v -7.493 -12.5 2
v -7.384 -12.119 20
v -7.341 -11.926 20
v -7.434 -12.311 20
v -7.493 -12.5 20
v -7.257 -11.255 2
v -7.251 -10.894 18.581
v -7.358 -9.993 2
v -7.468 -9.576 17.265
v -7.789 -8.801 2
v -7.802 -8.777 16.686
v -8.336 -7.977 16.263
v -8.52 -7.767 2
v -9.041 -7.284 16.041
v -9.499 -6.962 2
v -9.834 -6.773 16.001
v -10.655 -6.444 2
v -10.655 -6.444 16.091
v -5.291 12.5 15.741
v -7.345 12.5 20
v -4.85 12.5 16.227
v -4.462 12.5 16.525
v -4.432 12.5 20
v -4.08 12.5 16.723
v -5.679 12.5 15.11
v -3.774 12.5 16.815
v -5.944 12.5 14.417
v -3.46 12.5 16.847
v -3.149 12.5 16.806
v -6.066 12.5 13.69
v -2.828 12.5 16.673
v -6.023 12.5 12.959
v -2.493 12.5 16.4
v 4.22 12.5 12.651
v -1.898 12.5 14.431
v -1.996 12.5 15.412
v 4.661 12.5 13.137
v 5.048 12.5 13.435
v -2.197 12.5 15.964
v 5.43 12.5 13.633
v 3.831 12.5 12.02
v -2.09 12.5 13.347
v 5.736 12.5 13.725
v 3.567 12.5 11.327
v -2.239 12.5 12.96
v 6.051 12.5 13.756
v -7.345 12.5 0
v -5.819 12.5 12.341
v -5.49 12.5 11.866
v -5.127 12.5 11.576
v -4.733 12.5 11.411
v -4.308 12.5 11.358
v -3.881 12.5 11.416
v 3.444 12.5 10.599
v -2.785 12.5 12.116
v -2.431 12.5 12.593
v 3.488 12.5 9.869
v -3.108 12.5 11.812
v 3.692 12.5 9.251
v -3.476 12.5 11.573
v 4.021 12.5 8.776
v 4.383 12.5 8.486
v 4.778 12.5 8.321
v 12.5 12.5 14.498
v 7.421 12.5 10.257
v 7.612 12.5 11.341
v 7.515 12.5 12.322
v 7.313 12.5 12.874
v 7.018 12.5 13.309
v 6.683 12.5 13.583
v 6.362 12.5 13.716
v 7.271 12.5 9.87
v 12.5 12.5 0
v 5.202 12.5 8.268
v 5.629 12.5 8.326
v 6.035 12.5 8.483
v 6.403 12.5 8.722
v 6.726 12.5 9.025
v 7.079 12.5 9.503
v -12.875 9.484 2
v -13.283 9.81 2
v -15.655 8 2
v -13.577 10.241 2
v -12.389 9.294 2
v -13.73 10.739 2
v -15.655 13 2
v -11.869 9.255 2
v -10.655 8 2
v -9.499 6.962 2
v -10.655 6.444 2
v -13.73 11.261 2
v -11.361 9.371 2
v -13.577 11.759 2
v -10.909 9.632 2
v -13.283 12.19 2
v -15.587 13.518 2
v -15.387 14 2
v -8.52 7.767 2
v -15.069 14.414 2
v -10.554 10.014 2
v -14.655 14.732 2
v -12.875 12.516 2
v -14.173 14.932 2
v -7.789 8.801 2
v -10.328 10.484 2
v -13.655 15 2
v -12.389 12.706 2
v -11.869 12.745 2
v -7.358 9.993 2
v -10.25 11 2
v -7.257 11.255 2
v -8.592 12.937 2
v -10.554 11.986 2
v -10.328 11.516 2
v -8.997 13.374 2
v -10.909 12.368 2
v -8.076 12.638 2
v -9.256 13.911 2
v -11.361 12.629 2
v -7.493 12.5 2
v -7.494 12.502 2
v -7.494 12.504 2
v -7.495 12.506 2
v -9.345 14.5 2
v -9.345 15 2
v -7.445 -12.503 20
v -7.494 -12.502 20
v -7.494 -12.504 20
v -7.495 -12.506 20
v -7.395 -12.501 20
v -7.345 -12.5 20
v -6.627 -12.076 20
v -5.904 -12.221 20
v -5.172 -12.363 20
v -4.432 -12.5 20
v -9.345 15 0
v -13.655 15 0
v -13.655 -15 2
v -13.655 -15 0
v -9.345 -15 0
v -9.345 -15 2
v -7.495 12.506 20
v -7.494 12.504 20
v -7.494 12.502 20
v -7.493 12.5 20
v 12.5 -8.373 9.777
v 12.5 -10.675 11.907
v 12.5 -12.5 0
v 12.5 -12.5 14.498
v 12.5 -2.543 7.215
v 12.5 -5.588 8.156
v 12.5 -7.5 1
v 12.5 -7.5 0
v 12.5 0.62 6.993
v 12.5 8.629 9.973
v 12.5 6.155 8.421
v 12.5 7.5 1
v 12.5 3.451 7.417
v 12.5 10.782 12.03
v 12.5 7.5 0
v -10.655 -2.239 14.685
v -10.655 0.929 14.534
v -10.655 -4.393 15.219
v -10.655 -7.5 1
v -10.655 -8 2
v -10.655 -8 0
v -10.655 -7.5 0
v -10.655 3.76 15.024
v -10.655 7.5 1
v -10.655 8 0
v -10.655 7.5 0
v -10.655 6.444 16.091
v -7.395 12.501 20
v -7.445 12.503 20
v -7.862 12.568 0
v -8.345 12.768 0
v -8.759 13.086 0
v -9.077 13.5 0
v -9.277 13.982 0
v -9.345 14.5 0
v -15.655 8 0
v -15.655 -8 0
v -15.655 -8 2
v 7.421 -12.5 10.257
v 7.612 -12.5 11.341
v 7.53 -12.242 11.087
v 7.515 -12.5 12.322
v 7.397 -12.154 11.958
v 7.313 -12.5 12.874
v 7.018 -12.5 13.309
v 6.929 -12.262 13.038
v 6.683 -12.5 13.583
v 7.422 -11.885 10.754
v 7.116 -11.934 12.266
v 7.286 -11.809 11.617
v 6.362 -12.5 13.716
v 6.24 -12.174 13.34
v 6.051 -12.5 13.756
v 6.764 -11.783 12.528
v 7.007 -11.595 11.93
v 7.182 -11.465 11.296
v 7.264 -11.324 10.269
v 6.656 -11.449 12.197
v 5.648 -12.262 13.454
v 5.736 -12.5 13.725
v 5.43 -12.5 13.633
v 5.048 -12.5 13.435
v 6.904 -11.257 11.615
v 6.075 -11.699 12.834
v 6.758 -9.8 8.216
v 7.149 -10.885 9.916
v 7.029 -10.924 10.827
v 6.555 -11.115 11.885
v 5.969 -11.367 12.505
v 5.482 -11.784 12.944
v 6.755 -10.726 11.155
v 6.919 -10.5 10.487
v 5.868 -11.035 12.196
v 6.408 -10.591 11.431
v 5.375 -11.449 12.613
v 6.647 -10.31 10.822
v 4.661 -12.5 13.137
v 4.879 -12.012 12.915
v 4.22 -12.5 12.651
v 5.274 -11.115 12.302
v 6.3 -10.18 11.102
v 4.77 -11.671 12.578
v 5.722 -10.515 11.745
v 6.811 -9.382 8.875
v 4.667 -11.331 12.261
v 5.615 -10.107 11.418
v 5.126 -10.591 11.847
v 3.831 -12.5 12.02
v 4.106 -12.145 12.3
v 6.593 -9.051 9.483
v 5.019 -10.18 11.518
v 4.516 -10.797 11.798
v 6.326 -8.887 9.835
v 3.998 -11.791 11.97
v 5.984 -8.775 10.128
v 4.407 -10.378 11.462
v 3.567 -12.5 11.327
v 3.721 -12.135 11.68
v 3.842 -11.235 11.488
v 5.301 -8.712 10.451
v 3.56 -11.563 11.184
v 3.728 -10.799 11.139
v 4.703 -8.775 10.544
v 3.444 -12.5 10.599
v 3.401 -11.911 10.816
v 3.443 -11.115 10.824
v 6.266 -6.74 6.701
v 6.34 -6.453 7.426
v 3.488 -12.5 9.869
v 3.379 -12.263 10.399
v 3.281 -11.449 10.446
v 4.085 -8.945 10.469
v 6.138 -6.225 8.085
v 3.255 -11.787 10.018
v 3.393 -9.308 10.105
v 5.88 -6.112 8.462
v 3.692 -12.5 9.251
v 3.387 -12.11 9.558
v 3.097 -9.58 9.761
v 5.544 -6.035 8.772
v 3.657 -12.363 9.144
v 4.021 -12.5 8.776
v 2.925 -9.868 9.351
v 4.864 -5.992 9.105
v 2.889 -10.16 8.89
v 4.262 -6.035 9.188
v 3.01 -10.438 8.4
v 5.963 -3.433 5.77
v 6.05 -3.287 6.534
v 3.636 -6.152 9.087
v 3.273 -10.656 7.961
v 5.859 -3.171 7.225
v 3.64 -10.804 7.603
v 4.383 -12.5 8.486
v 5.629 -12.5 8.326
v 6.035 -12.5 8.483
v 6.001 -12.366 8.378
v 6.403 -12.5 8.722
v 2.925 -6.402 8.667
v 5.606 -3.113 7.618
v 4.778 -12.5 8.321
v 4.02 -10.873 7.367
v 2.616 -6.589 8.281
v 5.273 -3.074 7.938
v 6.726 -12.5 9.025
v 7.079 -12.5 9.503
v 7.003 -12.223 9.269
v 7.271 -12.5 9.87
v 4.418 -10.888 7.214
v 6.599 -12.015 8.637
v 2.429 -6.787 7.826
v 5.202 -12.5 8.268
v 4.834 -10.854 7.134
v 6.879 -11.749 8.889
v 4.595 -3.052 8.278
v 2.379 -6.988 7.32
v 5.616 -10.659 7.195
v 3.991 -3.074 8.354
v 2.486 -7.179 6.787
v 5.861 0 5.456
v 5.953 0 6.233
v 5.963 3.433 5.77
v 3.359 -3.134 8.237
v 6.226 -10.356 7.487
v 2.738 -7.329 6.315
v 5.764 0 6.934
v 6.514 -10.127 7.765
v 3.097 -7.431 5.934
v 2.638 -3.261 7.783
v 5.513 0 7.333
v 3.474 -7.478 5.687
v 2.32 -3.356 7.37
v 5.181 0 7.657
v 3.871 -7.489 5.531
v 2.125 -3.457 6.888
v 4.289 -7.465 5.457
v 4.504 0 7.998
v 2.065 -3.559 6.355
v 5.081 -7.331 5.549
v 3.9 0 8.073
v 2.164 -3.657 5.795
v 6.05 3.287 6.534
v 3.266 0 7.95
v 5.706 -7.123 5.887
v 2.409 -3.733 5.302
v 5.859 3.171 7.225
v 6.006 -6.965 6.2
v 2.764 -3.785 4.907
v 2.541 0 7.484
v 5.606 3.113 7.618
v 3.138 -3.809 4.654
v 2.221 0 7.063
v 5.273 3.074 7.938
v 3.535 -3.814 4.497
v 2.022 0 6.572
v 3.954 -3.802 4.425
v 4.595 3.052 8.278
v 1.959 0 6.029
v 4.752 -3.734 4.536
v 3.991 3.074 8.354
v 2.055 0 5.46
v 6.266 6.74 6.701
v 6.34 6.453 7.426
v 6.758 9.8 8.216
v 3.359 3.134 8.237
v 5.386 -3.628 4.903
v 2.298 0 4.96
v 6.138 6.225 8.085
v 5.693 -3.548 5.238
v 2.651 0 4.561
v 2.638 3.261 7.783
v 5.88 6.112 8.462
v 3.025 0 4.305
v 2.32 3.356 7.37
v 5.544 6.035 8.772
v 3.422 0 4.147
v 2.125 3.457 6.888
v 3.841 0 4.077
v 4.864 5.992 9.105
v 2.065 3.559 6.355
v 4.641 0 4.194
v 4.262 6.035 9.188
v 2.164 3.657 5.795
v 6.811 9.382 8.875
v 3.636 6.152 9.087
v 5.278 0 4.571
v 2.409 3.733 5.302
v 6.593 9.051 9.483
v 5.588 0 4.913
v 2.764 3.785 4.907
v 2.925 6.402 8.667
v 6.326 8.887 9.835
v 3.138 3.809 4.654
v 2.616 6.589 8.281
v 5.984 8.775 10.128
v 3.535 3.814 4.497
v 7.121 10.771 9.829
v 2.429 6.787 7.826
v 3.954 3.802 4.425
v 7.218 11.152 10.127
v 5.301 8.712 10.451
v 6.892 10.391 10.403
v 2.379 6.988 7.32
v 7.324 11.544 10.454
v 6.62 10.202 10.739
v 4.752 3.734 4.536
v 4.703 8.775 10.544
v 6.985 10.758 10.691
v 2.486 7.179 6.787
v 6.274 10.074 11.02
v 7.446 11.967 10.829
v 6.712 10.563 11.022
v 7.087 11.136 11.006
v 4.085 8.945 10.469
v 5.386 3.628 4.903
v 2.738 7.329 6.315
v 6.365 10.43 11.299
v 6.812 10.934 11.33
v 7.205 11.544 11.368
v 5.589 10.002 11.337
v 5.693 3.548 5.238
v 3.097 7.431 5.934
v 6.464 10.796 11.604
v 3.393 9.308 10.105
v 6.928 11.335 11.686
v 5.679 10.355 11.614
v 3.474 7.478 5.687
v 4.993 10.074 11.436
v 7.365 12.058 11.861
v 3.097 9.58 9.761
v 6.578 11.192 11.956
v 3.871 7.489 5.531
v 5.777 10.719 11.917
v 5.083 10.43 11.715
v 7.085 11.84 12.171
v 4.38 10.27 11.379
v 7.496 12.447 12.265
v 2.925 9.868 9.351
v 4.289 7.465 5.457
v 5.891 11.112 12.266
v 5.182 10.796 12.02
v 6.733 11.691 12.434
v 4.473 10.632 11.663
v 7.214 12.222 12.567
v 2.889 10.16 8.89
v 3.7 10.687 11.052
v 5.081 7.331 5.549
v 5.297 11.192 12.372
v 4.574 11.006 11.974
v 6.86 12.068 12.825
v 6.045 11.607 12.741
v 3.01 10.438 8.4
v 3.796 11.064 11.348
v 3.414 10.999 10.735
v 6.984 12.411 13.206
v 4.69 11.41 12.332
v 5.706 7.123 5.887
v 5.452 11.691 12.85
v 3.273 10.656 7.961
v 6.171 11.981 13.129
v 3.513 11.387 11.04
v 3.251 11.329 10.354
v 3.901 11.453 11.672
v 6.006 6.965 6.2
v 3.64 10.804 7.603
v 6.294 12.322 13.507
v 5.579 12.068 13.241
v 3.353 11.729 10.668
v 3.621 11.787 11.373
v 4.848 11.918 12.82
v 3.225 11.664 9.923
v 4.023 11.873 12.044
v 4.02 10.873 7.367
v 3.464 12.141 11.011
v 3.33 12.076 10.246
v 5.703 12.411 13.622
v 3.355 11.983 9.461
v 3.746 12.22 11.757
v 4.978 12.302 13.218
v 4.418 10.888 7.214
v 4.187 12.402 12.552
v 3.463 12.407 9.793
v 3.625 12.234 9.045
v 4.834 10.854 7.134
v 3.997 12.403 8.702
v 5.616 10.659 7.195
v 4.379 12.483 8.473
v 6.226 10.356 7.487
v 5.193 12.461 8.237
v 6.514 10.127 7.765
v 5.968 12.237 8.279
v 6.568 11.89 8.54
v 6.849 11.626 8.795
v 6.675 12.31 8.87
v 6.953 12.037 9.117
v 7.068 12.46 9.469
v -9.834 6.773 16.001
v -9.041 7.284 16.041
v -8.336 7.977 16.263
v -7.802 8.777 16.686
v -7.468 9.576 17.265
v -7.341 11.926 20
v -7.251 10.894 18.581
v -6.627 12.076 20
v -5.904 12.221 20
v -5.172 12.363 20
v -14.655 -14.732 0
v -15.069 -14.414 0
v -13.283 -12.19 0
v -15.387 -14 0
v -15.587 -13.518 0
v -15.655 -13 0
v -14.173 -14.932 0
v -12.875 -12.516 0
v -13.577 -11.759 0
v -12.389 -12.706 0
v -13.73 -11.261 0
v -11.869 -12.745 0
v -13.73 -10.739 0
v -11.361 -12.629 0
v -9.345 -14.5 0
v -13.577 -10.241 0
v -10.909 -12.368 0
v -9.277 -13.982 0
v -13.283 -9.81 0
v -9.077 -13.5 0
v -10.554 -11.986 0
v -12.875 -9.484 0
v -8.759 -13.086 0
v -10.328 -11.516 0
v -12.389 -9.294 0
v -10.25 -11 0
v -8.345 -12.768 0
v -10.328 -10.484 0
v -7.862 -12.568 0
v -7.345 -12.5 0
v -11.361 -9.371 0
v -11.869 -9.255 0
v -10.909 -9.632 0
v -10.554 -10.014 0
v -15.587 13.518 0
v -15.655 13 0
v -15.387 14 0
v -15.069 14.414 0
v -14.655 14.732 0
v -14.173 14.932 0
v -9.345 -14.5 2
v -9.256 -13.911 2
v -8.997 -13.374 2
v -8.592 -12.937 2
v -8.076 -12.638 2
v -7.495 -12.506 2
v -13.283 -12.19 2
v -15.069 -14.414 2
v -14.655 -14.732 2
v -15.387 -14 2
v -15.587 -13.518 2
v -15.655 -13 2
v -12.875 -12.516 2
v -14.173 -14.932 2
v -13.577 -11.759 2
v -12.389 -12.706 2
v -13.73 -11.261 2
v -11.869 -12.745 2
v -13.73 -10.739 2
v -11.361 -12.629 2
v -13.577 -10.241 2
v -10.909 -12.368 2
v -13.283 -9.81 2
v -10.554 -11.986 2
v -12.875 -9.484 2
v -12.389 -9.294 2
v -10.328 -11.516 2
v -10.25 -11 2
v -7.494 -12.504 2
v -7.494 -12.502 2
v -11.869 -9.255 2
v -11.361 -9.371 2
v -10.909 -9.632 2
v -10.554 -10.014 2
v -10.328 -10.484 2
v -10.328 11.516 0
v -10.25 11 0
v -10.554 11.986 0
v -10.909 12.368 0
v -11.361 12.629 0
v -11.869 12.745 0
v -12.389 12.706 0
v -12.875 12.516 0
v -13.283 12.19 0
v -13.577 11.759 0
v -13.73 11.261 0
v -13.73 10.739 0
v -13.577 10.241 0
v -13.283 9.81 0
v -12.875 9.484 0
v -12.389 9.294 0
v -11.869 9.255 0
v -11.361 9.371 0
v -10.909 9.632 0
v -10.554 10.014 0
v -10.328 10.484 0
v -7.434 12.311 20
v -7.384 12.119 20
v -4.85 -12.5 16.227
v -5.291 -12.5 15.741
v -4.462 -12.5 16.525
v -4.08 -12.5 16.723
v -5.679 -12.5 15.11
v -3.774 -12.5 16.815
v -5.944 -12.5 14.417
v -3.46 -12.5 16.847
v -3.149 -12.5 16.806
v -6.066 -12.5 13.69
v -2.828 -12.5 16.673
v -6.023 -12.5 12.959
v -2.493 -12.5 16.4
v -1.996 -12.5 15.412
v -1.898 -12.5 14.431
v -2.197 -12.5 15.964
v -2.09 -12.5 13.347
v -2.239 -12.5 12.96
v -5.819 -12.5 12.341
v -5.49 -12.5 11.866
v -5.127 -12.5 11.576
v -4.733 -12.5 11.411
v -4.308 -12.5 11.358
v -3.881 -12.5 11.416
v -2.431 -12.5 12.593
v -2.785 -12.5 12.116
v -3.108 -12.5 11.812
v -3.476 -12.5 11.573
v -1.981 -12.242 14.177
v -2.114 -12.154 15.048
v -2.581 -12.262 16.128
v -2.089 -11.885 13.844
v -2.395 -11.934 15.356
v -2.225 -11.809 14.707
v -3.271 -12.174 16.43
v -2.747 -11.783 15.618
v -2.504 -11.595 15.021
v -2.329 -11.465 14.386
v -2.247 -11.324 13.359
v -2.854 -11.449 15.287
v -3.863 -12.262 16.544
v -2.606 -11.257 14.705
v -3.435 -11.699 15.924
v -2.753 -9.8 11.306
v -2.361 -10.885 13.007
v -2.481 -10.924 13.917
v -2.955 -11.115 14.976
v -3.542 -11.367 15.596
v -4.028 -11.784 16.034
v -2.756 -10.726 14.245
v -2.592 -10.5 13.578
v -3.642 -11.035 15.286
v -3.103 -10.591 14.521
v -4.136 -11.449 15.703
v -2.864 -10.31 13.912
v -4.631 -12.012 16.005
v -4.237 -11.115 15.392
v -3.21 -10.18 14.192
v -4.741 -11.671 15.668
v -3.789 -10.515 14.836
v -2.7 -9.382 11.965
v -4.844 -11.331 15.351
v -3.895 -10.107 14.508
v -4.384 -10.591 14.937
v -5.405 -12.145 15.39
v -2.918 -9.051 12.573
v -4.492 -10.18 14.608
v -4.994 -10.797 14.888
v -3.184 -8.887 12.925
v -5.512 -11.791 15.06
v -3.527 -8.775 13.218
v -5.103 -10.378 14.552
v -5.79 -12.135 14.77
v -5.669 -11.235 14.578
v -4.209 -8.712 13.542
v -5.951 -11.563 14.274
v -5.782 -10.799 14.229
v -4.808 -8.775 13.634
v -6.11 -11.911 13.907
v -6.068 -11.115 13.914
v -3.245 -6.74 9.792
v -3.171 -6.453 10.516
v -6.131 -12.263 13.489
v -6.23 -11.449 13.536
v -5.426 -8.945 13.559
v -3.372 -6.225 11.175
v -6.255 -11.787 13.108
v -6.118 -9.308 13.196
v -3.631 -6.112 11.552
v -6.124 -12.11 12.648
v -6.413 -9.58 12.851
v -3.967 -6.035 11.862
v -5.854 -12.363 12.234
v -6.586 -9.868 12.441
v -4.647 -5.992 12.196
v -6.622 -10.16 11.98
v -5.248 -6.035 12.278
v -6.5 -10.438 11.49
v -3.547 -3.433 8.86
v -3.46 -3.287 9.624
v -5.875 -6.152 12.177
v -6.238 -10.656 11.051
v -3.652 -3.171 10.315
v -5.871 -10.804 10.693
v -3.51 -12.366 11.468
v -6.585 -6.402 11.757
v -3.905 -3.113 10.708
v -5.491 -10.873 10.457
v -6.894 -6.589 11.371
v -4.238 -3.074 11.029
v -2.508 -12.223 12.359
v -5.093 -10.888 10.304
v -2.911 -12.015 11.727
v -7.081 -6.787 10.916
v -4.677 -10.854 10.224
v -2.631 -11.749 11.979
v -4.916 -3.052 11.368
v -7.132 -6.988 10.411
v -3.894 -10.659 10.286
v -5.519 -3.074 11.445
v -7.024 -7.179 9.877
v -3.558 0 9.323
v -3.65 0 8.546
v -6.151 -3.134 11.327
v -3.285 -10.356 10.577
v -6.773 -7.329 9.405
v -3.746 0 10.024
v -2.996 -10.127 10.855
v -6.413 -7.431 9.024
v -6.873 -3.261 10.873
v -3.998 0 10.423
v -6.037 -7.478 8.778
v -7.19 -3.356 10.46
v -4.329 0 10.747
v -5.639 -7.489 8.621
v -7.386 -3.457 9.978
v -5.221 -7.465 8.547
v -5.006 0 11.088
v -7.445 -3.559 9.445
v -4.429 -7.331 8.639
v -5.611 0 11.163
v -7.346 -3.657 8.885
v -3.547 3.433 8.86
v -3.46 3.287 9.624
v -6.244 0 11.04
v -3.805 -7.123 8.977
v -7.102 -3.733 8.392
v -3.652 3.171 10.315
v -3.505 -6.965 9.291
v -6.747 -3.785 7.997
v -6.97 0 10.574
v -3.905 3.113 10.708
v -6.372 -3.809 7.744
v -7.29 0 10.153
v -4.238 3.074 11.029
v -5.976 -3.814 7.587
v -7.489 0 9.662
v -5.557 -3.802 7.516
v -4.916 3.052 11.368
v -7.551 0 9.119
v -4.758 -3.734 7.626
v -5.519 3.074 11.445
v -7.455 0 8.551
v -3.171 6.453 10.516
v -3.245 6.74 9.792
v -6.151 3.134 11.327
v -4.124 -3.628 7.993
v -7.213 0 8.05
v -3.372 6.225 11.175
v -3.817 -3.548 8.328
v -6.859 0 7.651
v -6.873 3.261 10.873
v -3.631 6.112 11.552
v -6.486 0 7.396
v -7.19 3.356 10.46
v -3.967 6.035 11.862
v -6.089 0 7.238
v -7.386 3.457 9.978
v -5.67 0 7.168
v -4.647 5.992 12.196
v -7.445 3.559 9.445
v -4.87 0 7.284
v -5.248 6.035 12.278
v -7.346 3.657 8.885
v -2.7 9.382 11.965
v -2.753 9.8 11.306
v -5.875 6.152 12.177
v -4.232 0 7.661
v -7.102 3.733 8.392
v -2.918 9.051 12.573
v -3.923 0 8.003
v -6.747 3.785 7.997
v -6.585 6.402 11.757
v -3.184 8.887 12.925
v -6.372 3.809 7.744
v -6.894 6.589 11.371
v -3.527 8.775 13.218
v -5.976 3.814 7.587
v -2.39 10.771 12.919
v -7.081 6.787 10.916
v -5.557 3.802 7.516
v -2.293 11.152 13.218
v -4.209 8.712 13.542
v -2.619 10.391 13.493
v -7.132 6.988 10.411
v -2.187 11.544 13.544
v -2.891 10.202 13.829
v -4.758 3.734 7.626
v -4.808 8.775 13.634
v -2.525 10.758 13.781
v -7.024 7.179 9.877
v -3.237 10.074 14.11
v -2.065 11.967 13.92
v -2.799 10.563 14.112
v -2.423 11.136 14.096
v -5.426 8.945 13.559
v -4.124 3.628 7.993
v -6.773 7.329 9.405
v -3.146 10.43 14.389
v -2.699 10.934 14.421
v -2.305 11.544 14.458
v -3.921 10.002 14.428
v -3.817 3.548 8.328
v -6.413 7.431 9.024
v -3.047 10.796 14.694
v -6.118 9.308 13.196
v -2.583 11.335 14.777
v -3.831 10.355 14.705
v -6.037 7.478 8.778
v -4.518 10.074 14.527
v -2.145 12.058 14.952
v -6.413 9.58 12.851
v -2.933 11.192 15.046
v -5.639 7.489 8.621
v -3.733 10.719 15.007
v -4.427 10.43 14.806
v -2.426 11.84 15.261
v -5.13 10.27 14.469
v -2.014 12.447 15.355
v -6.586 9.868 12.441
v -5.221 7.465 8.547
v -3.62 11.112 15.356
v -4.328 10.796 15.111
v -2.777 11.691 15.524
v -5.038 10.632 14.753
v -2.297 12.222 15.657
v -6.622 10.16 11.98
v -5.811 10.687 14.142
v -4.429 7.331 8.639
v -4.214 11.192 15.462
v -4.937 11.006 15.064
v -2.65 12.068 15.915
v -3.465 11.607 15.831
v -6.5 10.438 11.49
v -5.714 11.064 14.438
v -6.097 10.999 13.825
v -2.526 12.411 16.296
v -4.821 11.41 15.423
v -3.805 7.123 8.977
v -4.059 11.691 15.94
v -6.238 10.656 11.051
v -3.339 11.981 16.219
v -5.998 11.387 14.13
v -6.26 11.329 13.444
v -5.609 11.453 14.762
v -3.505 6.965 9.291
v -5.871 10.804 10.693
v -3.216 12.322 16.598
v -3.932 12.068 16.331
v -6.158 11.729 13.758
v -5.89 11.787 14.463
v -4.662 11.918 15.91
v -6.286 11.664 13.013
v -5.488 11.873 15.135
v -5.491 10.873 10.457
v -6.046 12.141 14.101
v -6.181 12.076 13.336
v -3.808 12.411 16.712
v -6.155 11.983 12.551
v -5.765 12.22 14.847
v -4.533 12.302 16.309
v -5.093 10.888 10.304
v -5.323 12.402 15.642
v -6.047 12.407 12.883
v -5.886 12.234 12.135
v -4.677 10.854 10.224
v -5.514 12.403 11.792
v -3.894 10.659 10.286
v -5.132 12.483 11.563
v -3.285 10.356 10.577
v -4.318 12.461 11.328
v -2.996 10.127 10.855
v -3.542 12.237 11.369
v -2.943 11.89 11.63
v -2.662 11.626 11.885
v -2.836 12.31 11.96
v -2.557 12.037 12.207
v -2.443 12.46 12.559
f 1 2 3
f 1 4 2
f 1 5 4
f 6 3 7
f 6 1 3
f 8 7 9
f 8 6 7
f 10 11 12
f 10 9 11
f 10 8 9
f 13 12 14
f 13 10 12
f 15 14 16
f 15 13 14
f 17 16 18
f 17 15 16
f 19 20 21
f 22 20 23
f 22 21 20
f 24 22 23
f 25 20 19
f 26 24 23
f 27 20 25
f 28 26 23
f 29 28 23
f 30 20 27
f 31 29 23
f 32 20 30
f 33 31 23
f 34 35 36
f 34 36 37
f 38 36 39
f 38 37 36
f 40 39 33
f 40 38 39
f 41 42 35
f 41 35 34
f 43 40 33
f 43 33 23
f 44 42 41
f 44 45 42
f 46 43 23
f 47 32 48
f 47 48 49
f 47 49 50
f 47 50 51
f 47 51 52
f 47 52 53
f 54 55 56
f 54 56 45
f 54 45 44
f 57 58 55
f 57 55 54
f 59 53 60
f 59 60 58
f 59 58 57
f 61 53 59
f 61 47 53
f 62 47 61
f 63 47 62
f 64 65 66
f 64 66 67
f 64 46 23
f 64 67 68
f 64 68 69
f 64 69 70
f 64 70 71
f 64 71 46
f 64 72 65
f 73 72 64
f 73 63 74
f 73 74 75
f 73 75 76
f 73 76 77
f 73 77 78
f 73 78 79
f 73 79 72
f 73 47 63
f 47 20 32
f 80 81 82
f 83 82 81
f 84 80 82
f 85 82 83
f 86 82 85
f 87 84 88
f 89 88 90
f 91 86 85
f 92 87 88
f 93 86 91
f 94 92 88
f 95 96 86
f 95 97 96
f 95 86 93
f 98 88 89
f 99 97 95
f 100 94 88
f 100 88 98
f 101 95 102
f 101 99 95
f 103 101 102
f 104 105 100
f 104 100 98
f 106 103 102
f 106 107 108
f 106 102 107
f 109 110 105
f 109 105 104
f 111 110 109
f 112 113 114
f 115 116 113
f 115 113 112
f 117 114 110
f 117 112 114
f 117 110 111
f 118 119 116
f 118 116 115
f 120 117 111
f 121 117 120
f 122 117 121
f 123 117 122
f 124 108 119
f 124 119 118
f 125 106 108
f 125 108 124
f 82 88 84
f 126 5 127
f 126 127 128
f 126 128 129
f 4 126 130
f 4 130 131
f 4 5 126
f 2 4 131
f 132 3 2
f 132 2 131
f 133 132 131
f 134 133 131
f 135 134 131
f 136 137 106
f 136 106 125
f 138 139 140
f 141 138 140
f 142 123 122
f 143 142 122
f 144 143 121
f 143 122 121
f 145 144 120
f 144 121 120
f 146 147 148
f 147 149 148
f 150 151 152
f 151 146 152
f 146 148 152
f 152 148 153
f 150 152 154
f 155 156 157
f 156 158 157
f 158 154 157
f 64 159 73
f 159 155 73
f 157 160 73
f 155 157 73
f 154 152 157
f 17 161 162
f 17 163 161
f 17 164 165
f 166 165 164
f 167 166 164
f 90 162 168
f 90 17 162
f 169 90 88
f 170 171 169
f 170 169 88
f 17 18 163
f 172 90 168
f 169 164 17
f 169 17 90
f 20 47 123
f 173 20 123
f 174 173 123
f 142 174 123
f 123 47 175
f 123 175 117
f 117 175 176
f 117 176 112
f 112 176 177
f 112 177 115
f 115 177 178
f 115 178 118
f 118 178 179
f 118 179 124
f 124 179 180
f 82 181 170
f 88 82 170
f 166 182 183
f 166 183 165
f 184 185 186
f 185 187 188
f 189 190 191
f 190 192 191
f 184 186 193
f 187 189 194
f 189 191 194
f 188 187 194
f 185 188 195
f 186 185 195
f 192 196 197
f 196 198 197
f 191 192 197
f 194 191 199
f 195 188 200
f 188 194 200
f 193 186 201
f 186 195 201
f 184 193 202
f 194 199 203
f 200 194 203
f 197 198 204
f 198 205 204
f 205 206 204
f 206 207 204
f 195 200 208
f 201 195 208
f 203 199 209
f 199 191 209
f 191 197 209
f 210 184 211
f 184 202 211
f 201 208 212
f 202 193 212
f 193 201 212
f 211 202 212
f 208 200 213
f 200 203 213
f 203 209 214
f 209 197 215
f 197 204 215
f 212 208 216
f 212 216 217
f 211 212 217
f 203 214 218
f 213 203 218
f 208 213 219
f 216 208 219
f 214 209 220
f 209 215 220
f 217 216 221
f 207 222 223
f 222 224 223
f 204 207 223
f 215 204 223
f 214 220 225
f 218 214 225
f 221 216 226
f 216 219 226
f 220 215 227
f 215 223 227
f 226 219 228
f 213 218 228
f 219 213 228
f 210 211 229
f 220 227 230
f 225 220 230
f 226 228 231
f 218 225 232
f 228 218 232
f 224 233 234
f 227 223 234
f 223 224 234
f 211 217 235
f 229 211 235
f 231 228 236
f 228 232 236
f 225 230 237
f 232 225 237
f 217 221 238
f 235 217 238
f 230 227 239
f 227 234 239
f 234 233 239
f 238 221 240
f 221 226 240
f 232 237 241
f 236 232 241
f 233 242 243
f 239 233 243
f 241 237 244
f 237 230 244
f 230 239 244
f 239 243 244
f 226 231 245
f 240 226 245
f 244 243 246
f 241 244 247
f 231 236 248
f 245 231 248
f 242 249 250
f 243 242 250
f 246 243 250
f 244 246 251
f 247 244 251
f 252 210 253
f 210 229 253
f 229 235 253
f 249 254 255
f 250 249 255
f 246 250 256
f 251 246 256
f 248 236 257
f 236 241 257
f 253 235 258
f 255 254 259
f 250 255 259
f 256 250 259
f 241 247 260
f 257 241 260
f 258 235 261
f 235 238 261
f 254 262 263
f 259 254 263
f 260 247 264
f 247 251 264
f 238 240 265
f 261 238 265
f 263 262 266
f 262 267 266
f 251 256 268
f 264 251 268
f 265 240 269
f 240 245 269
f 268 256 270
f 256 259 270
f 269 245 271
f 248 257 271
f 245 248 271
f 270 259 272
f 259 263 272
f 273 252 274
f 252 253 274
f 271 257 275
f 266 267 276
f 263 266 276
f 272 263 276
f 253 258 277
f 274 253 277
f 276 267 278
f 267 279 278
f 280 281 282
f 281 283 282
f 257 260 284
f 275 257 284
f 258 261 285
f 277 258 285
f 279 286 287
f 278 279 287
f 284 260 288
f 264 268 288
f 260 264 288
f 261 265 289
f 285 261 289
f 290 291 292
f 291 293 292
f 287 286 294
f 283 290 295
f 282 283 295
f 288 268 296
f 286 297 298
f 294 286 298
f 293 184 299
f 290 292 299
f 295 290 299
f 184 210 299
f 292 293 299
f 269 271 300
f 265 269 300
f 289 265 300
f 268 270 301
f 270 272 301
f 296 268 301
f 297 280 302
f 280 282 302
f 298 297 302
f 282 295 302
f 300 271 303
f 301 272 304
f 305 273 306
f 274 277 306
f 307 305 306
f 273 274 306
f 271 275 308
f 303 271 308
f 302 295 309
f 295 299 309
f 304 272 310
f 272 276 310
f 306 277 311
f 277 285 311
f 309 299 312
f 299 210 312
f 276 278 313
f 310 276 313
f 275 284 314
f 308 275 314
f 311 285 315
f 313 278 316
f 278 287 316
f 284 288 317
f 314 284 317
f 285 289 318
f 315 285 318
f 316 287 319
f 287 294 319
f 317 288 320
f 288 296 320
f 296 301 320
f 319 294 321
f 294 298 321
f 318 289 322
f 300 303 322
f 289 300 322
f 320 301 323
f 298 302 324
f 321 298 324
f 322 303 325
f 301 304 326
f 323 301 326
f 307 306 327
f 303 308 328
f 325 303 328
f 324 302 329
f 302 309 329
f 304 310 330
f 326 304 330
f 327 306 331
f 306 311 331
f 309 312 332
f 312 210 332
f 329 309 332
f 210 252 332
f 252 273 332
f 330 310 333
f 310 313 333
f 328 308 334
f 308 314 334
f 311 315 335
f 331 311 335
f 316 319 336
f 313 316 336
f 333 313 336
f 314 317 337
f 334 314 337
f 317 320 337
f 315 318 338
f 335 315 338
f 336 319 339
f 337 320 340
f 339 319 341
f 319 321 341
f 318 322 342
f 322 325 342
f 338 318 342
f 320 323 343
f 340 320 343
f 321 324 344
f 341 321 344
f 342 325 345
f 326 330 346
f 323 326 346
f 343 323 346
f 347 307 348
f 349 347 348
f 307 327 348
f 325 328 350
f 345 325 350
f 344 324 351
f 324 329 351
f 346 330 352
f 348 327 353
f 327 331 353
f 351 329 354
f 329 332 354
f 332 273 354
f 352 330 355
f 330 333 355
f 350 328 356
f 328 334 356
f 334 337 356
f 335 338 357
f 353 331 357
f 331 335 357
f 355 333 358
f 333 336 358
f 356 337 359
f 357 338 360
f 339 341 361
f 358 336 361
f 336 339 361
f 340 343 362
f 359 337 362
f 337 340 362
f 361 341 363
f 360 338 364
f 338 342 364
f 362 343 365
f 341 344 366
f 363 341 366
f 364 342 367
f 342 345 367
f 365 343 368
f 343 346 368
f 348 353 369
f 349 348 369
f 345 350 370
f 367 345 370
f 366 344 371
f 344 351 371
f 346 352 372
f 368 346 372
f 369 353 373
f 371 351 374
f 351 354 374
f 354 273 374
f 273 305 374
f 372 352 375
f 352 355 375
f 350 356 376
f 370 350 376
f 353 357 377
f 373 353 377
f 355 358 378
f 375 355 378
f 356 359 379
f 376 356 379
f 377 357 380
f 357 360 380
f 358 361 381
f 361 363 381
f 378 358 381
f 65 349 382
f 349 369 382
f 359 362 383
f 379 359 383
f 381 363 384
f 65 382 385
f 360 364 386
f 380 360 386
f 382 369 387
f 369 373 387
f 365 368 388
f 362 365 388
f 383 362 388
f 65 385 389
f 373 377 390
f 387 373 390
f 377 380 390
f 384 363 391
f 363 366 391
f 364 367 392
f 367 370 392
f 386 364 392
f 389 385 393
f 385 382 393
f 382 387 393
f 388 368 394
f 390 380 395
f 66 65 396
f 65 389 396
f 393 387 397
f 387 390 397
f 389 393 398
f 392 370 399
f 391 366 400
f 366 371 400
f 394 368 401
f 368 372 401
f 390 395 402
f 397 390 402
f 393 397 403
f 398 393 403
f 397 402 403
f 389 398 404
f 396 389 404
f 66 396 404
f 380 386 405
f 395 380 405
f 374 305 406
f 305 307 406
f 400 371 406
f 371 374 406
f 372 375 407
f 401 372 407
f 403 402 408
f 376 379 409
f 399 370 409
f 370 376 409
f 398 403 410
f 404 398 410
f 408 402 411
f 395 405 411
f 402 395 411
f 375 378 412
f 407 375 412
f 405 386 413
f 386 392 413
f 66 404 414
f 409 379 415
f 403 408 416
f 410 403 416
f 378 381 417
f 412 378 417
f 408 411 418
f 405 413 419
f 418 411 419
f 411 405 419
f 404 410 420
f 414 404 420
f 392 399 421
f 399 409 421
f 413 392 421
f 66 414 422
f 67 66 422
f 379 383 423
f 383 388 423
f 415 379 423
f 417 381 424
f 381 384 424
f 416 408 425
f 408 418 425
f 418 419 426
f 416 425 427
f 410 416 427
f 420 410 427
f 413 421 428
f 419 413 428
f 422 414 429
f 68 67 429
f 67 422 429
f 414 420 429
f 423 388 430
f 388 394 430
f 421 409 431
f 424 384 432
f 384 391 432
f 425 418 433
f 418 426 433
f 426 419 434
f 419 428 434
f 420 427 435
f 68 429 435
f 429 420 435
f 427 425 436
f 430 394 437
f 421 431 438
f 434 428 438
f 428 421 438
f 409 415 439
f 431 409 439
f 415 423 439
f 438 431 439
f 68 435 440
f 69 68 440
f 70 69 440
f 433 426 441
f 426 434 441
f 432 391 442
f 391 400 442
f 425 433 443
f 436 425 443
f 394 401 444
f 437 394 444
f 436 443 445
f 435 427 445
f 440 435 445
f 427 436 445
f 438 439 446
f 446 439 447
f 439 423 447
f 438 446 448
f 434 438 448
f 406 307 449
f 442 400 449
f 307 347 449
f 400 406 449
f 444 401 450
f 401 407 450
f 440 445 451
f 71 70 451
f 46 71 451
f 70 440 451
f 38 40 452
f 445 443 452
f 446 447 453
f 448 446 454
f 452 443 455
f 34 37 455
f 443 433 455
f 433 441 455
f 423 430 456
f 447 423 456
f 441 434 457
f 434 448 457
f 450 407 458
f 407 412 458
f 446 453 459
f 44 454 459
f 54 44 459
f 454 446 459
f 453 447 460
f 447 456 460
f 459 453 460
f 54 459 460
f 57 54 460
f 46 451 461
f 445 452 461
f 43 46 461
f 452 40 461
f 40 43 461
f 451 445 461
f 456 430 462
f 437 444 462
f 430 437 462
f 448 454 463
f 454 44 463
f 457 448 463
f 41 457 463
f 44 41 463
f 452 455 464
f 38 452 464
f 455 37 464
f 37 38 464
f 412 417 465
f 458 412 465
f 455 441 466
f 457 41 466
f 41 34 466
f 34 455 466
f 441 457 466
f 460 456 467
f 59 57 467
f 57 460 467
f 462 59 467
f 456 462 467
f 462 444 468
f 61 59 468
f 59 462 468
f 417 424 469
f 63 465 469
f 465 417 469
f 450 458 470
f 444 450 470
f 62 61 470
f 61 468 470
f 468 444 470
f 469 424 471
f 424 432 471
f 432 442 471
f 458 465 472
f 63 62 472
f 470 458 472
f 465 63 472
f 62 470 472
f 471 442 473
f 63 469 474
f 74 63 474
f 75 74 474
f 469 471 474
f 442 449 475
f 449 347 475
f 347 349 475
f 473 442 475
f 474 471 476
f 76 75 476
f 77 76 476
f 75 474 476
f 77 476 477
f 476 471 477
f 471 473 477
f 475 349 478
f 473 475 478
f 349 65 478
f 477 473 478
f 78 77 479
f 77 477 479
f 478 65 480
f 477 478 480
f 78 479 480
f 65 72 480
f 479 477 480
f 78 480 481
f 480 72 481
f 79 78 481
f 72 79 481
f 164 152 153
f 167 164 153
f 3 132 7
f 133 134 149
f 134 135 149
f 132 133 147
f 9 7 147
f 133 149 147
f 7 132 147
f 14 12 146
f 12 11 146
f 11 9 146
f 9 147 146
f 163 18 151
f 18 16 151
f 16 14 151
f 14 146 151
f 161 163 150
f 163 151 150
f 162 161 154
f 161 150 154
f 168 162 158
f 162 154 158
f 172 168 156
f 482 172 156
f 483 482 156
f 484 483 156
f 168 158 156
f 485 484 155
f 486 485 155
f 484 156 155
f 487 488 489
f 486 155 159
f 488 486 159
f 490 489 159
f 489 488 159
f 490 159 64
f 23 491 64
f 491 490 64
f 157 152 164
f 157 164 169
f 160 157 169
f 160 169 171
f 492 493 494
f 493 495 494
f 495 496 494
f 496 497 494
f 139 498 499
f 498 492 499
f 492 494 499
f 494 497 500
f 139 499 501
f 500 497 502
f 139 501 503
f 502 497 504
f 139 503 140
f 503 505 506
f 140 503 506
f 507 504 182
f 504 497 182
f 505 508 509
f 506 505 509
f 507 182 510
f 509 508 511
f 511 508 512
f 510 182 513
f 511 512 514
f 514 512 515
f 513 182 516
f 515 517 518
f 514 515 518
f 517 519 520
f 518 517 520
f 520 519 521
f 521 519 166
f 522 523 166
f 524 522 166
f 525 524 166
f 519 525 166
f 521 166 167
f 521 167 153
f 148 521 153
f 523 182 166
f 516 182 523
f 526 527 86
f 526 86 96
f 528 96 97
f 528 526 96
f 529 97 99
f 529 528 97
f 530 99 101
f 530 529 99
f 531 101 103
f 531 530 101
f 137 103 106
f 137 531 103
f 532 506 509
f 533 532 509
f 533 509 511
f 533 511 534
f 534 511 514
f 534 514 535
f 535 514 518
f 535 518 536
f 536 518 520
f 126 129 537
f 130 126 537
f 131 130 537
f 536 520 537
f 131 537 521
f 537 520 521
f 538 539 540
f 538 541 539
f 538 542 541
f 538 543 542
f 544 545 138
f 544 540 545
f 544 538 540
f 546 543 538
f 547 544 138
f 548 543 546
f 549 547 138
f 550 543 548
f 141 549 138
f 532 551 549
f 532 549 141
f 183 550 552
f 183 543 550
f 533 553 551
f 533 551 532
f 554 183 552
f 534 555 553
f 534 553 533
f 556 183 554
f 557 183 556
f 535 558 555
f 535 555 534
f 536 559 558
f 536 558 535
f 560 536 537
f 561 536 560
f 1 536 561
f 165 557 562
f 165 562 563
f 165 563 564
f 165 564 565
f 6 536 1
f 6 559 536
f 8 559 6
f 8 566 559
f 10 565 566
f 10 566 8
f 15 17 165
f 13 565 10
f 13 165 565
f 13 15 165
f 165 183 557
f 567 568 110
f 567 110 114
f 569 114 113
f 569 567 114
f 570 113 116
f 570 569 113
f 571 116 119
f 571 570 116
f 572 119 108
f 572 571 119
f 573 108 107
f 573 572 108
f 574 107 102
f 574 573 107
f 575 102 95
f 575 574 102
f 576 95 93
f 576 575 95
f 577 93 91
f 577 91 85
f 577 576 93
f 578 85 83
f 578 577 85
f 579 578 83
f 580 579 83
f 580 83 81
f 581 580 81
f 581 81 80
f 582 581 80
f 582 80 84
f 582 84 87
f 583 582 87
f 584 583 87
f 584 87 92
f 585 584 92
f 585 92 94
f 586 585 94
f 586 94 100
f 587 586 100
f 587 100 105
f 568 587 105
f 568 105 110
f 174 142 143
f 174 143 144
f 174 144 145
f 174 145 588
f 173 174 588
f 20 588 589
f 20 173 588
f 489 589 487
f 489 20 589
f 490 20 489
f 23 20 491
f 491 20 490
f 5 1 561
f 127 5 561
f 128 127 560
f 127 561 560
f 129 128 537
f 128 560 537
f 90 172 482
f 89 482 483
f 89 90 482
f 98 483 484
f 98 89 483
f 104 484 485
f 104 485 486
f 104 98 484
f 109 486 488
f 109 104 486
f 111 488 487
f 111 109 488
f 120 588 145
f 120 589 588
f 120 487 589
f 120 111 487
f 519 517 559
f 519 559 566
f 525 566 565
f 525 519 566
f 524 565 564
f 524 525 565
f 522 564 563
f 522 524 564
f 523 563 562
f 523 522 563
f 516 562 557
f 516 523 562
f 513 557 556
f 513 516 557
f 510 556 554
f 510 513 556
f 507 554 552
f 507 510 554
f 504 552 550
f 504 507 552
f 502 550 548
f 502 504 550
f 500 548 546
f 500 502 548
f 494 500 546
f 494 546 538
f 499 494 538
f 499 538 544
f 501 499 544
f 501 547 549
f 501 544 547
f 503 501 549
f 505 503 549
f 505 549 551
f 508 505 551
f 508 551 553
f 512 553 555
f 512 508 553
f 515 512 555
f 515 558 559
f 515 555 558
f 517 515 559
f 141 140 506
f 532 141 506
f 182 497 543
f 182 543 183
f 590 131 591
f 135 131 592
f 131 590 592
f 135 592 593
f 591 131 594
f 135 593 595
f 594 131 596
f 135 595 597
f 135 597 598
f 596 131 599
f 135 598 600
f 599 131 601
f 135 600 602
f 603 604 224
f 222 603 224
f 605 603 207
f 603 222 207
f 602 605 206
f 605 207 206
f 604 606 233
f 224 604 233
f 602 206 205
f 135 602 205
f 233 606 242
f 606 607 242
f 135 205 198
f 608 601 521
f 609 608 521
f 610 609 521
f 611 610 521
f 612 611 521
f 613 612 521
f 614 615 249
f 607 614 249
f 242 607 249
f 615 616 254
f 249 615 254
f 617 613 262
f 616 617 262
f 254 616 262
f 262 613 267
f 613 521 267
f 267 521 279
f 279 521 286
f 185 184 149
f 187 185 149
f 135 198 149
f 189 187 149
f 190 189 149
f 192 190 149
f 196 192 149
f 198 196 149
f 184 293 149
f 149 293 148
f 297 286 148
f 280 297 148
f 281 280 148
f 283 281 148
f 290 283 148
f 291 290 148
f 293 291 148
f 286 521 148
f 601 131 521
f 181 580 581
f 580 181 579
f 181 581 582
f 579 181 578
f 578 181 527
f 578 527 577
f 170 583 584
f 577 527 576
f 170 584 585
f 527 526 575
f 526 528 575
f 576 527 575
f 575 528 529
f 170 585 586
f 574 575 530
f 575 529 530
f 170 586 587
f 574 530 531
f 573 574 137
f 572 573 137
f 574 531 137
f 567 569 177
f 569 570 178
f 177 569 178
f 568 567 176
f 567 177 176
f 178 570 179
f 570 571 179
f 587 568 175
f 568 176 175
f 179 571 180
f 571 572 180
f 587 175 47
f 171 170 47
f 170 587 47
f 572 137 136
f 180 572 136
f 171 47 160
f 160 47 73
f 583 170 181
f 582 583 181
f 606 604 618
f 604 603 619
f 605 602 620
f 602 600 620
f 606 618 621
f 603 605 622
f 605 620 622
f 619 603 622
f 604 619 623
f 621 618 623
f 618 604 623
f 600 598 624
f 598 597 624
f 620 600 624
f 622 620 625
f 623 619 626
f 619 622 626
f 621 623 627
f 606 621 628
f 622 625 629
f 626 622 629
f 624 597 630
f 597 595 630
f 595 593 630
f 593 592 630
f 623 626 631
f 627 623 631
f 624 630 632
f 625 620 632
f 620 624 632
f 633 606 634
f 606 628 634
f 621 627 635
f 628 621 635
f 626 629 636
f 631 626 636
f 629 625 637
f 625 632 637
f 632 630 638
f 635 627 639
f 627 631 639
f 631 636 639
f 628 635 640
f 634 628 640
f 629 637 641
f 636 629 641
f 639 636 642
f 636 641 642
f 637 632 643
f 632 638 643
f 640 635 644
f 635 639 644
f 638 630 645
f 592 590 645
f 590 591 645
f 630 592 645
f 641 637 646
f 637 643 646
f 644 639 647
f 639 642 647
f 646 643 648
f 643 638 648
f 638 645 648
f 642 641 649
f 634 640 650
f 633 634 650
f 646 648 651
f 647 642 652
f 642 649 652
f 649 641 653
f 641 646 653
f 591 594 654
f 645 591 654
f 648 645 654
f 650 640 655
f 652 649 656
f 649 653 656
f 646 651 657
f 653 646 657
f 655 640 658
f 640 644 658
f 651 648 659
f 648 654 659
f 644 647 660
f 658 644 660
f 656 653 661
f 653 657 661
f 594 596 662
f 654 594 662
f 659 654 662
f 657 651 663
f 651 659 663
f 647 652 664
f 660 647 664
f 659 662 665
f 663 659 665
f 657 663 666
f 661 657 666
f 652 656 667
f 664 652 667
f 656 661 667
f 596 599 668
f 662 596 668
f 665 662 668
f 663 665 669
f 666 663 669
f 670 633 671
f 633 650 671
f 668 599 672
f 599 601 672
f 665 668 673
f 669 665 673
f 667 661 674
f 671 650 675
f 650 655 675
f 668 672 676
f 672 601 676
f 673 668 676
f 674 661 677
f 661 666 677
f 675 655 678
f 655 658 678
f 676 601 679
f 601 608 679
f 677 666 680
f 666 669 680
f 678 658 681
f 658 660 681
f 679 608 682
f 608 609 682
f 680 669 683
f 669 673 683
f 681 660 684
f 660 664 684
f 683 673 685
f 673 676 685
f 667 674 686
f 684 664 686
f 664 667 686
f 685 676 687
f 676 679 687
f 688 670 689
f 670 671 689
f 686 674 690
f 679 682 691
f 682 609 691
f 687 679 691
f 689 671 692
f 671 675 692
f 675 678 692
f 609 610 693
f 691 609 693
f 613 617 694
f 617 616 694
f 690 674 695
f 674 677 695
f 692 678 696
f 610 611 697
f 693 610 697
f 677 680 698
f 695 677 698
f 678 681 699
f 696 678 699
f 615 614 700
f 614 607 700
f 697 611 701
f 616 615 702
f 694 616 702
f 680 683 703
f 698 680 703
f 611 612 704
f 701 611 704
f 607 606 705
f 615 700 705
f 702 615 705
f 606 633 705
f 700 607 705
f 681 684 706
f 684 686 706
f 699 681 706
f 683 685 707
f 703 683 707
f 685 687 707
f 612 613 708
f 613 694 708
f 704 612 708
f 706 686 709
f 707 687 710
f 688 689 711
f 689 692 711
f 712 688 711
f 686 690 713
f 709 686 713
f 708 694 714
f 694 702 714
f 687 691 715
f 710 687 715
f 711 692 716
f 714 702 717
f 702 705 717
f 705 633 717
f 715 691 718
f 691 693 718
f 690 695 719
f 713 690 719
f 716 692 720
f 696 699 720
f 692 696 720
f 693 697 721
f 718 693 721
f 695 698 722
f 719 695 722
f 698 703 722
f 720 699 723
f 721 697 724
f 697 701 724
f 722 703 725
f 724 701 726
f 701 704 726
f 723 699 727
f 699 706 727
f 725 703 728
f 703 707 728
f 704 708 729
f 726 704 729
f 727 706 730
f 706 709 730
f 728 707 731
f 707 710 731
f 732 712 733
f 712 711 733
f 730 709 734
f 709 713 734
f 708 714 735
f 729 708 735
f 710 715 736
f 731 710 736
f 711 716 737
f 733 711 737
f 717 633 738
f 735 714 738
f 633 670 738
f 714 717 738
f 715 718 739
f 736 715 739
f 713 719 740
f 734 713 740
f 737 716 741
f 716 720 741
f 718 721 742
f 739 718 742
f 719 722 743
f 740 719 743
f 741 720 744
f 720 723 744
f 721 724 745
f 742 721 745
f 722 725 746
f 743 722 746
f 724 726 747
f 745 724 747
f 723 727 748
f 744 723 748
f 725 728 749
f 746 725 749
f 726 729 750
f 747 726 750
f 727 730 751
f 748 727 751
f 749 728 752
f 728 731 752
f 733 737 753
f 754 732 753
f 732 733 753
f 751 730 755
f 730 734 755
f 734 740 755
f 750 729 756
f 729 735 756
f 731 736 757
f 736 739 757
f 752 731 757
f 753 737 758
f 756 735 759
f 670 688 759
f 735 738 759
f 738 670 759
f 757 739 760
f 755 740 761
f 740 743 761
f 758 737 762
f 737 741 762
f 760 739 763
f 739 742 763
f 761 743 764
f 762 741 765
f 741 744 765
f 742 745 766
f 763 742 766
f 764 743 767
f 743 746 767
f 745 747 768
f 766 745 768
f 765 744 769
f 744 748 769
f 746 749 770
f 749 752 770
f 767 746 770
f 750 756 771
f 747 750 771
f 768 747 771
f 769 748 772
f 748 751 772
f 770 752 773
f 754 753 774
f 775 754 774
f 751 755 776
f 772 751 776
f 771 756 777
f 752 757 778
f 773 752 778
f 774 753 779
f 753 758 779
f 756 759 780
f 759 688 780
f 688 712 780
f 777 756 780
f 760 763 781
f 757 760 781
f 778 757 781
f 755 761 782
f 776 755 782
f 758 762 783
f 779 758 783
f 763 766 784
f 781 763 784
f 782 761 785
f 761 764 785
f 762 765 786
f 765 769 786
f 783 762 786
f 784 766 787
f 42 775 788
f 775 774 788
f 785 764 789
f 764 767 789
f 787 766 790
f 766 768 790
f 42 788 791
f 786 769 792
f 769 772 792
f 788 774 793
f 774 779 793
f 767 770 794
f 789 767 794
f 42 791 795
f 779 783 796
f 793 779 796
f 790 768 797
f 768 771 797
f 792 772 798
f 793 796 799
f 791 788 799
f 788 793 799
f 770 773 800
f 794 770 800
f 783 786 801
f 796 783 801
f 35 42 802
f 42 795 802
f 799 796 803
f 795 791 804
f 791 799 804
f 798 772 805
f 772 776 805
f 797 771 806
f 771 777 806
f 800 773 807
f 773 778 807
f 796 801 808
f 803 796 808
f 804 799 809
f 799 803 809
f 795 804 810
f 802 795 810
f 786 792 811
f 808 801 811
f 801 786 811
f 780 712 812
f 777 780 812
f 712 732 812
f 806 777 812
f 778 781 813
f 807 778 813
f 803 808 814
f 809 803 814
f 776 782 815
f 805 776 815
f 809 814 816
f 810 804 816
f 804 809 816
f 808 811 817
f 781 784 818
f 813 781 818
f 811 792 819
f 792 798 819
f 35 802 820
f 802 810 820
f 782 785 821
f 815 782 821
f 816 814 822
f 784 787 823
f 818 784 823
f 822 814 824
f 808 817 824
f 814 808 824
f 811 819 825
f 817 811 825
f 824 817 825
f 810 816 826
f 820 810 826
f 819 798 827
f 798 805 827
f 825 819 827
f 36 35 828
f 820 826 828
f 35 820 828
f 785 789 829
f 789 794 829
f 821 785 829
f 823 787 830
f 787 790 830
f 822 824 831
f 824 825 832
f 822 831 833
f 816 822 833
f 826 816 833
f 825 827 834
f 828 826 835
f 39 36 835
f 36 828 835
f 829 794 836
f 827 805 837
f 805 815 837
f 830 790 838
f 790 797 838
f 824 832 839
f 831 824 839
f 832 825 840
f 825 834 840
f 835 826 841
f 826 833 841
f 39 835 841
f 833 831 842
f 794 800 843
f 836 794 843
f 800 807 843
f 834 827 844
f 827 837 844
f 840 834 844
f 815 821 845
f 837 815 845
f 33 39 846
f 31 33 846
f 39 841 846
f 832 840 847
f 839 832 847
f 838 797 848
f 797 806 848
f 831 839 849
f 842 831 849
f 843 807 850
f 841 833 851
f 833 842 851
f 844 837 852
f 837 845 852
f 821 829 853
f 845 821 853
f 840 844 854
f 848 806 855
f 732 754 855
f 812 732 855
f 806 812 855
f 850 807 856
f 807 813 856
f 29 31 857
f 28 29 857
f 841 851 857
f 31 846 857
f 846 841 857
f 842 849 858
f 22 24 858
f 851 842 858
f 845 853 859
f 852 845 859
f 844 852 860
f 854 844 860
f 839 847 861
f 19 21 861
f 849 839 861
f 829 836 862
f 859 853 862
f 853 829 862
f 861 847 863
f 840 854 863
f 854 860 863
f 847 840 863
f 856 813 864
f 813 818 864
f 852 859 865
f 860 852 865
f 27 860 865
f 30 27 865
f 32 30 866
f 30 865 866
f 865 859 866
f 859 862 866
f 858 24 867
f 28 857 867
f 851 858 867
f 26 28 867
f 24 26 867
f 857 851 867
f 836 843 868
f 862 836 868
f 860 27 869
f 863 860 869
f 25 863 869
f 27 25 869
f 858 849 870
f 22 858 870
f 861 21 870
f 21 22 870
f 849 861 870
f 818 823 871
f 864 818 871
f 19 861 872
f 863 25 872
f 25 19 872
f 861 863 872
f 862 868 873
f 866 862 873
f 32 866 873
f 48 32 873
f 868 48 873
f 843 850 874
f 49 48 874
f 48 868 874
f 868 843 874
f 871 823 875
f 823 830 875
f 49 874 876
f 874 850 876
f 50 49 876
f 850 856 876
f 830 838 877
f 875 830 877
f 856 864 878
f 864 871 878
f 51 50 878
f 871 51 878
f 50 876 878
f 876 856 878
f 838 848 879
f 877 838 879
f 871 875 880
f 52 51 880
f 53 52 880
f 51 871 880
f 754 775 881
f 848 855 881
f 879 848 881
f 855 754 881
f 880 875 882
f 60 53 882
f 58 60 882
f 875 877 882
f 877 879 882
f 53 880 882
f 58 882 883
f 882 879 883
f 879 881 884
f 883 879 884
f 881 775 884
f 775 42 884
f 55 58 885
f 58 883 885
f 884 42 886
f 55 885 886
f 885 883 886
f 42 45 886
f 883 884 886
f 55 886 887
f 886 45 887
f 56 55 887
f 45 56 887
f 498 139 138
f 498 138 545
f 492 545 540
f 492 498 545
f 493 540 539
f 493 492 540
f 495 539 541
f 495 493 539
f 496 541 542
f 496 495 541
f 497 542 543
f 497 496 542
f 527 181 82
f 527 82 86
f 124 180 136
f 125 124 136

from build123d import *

# Parameters (mm, degrees)
SKETCH1_W               = 25
SKETCH1_H               = 25
BOSS_EXTRUDE1_DEPTH     = 20
SKETCH2_R               = 14.5
CUT_EXTRUDE1_DEPTH      = 36.825056471
SKETCH3_W               = 6.310364348
SKETCH3_H               = 30
BOSS_EXTRUDE2_DEPTH     = 2
SKETCH4_W               = 10
SKETCH4_H               = 16
CUT_EXTRUDE2_DEPTH      = 30.497198662
CUT_EXTRUDE3_DEPTH      = 29.179509025
CUT_EXTRUDE3_DEPTH_BACK = 29.179509025
SKETCH5_R               = 1.75
SKETCH7_R               = 4.75
CUT_EXTRUDE4_DEPTH      = 29.179509089
CUT_SWEEP1_PROFILE_R    = 2
LPATTERN1_COUNT         = 2
LPATTERN1_PITCH         = 10
FILLET1_START           = -1
FILLET1_DEPTH           = 21
FILLET1_2_DEPTH         = 2
FILLET1_START_2         = 1.80548
FILLET1_3_DEPTH         = 18.19452
SKETCH11_W              = 2
SKETCH11_H              = 15
CUT_EXTRUDE5_DEPTH      = 38.652546889


with BuildPart() as part:
    # Sketch1 → Boss-Extrude1 (new body)
    with BuildSketch(Plane.XY):
        Rectangle(SKETCH1_W, SKETCH1_H)
    extrude(amount=BOSS_EXTRUDE1_DEPTH)

    # Sketch2 → Cut-Extrude1 (cut, through all)
    with BuildSketch(Plane(origin=(11.306356215, 0, -3.673657827), x_dir=(0, 1, 0), z_dir=(0.9510565162951534, 0, -0.3090169943749482))):
        with Locations((0, 25)):
            Circle(SKETCH2_R)
    extrude(amount=-CUT_EXTRUDE1_DEPTH, mode=Mode.SUBTRACT)

    # Sketch3 → Boss-Extrude2 (add)
    with BuildSketch(Plane.XY):
        with Locations((-12.5, 0)):
            Rectangle(SKETCH3_W, SKETCH3_H)
    extrude(amount=BOSS_EXTRUDE2_DEPTH)

    # Sketch4 → Cut-Extrude2 (cut, through all)
    with BuildSketch(Plane.XY):
        with Locations((-15.655182174, 0)):
            Rectangle(SKETCH4_W, SKETCH4_H)
    extrude(amount=CUT_EXTRUDE2_DEPTH, mode=Mode.SUBTRACT)

    # Sketch5 → Cut-Extrude3 (cut, two sides: drawn at the far end of the back side and taken through both)
    with BuildSketch(Plane.XY.offset(2).offset(-CUT_EXTRUDE3_DEPTH_BACK)):
        with Locations((-12, 11)):
            Circle(SKETCH5_R)
        with Locations((-12, -11)):
            Circle(SKETCH5_R)
    extrude(amount=CUT_EXTRUDE3_DEPTH + CUT_EXTRUDE3_DEPTH_BACK, mode=Mode.SUBTRACT)

    # Sketch7 → Cut-Extrude4 (cut, through all)
    with BuildSketch(Plane.XY.offset(2)):
        with Locations((-12, 11)):
            Circle(SKETCH7_R)
        with Locations((-12, -11)):
            Circle(SKETCH7_R)
    extrude(amount=CUT_EXTRUDE4_DEPTH, mode=Mode.SUBTRACT)

    # Cut-Sweep1: sweep along a path in Sketch8
    with BuildLine(Plane(origin=(1.795791052, 0, -0.583487883), x_dir=(0, 1, 0), z_dir=(0.9510565162951534, 0, -0.3090169943749482))) as cut_sweep1_path:
        CenterArc((0, 25), 18, 0, 360)
    # Cut-Sweep1 profile (on start of the path) → Cut-Sweep1 (sweep, cut)
    with BuildSketch(Plane(origin=(9.521215911, 18, 23.192925024), x_dir=(0.9510565162951534, 0, -0.3090169943749482), z_dir=(0.3090169943749482, 0, 0.9510565162951534))):
        Circle(CUT_SWEEP1_PROFILE_R)
    cut_sweep1 = sweep(path=cut_sweep1_path.line, mode=Mode.SUBTRACT)

    # LPattern1: Cut-Sweep1 ×2
    with Locations(*[Vector(-0.9510565162951534, 0, 0.3090169943749481) * (i * LPATTERN1_PITCH) for i in range(1, LPATTERN1_COUNT)]):
        add(cut_sweep1, mode=Mode.SUBTRACT)

    # Fillet1: read off the stored shape, not the designer's step
    # Fillet1 outline → Fillet1 (cut)
    with BuildSketch(Plane.XY.offset(FILLET1_START)):
        with BuildLine():
            ThreePointArc((-15.655182174, 13), (-15.069395736, 14.414213562), (-13.655182174, 15))
            Line((-13.655182174, 15), (-15.655182174, 15))
            Line((-15.655182174, 15), (-15.655182174, 13))
        make_face()
        with BuildLine():
            Line((-15.655182174, -15), (-13.655182174, -15))
            ThreePointArc((-13.655182174, -15), (-15.069395736, -14.414213562), (-15.655182174, -13))
            Line((-15.655182174, -13), (-15.655182174, -15))
        make_face()
    extrude(amount=FILLET1_DEPTH, mode=Mode.SUBTRACT)

    # Fillet1 2 outline → Fillet1 2 (add)
    with BuildSketch(Plane.XY):
        with BuildLine():
            Line((-9.344817826, 14.5), (-9.344817826, 12.5))
            Line((-9.344817826, 12.5), (-7.344817826, 12.5))
            ThreePointArc((-7.344817826, 12.5), (-8.759031388, 13.085786438), (-9.344817826, 14.5))
        make_face()
        with BuildLine():
            Line((-9.344817826, -12.5), (-9.344817826, -14.5))
            ThreePointArc((-9.344817826, -14.5), (-8.759031388, -13.085786438), (-7.344817826, -12.5))
            Line((-7.344817826, -12.5), (-9.344817826, -12.5))
        make_face()
    extrude(amount=FILLET1_2_DEPTH)

    # Fillet1 3 outline → Fillet1 3 (add)
    with BuildSketch(Plane.XY.offset(FILLET1_START_2)):
        with BuildLine():
            ThreePointArc((-7.344817826, 12.5), (-7.419933265, 12.50141108), (-7.494942711, 12.505642329))
            ThreePointArc((-7.494942711, 12.505642329), (-7.494000925, 12.502821459), (-7.493060906, 12.5))
            Line((-7.493060906, 12.5), (-7.344817826, 12.5))
        make_face()
        with BuildLine():
            ThreePointArc((-7.493060906, -12.5), (-7.494000925, -12.502821459), (-7.494942711, -12.505642329))
            ThreePointArc((-7.494942711, -12.505642329), (-7.419933265, -12.50141108), (-7.344817826, -12.5))
            Line((-7.344817826, -12.5), (-7.493060906, -12.5))
        make_face()
    extrude(amount=FILLET1_3_DEPTH)

    # Sketch11 → Cut-Extrude5 (cut, through all)
    with BuildSketch(Plane(origin=(12.5, 0, 0), x_dir=(0, 0, -1), z_dir=(1, 0, 0))):
        Rectangle(SKETCH11_W, SKETCH11_H)
    extrude(amount=-CUT_EXTRUDE5_DEPTH, mode=Mode.SUBTRACT)


solid = part.part
